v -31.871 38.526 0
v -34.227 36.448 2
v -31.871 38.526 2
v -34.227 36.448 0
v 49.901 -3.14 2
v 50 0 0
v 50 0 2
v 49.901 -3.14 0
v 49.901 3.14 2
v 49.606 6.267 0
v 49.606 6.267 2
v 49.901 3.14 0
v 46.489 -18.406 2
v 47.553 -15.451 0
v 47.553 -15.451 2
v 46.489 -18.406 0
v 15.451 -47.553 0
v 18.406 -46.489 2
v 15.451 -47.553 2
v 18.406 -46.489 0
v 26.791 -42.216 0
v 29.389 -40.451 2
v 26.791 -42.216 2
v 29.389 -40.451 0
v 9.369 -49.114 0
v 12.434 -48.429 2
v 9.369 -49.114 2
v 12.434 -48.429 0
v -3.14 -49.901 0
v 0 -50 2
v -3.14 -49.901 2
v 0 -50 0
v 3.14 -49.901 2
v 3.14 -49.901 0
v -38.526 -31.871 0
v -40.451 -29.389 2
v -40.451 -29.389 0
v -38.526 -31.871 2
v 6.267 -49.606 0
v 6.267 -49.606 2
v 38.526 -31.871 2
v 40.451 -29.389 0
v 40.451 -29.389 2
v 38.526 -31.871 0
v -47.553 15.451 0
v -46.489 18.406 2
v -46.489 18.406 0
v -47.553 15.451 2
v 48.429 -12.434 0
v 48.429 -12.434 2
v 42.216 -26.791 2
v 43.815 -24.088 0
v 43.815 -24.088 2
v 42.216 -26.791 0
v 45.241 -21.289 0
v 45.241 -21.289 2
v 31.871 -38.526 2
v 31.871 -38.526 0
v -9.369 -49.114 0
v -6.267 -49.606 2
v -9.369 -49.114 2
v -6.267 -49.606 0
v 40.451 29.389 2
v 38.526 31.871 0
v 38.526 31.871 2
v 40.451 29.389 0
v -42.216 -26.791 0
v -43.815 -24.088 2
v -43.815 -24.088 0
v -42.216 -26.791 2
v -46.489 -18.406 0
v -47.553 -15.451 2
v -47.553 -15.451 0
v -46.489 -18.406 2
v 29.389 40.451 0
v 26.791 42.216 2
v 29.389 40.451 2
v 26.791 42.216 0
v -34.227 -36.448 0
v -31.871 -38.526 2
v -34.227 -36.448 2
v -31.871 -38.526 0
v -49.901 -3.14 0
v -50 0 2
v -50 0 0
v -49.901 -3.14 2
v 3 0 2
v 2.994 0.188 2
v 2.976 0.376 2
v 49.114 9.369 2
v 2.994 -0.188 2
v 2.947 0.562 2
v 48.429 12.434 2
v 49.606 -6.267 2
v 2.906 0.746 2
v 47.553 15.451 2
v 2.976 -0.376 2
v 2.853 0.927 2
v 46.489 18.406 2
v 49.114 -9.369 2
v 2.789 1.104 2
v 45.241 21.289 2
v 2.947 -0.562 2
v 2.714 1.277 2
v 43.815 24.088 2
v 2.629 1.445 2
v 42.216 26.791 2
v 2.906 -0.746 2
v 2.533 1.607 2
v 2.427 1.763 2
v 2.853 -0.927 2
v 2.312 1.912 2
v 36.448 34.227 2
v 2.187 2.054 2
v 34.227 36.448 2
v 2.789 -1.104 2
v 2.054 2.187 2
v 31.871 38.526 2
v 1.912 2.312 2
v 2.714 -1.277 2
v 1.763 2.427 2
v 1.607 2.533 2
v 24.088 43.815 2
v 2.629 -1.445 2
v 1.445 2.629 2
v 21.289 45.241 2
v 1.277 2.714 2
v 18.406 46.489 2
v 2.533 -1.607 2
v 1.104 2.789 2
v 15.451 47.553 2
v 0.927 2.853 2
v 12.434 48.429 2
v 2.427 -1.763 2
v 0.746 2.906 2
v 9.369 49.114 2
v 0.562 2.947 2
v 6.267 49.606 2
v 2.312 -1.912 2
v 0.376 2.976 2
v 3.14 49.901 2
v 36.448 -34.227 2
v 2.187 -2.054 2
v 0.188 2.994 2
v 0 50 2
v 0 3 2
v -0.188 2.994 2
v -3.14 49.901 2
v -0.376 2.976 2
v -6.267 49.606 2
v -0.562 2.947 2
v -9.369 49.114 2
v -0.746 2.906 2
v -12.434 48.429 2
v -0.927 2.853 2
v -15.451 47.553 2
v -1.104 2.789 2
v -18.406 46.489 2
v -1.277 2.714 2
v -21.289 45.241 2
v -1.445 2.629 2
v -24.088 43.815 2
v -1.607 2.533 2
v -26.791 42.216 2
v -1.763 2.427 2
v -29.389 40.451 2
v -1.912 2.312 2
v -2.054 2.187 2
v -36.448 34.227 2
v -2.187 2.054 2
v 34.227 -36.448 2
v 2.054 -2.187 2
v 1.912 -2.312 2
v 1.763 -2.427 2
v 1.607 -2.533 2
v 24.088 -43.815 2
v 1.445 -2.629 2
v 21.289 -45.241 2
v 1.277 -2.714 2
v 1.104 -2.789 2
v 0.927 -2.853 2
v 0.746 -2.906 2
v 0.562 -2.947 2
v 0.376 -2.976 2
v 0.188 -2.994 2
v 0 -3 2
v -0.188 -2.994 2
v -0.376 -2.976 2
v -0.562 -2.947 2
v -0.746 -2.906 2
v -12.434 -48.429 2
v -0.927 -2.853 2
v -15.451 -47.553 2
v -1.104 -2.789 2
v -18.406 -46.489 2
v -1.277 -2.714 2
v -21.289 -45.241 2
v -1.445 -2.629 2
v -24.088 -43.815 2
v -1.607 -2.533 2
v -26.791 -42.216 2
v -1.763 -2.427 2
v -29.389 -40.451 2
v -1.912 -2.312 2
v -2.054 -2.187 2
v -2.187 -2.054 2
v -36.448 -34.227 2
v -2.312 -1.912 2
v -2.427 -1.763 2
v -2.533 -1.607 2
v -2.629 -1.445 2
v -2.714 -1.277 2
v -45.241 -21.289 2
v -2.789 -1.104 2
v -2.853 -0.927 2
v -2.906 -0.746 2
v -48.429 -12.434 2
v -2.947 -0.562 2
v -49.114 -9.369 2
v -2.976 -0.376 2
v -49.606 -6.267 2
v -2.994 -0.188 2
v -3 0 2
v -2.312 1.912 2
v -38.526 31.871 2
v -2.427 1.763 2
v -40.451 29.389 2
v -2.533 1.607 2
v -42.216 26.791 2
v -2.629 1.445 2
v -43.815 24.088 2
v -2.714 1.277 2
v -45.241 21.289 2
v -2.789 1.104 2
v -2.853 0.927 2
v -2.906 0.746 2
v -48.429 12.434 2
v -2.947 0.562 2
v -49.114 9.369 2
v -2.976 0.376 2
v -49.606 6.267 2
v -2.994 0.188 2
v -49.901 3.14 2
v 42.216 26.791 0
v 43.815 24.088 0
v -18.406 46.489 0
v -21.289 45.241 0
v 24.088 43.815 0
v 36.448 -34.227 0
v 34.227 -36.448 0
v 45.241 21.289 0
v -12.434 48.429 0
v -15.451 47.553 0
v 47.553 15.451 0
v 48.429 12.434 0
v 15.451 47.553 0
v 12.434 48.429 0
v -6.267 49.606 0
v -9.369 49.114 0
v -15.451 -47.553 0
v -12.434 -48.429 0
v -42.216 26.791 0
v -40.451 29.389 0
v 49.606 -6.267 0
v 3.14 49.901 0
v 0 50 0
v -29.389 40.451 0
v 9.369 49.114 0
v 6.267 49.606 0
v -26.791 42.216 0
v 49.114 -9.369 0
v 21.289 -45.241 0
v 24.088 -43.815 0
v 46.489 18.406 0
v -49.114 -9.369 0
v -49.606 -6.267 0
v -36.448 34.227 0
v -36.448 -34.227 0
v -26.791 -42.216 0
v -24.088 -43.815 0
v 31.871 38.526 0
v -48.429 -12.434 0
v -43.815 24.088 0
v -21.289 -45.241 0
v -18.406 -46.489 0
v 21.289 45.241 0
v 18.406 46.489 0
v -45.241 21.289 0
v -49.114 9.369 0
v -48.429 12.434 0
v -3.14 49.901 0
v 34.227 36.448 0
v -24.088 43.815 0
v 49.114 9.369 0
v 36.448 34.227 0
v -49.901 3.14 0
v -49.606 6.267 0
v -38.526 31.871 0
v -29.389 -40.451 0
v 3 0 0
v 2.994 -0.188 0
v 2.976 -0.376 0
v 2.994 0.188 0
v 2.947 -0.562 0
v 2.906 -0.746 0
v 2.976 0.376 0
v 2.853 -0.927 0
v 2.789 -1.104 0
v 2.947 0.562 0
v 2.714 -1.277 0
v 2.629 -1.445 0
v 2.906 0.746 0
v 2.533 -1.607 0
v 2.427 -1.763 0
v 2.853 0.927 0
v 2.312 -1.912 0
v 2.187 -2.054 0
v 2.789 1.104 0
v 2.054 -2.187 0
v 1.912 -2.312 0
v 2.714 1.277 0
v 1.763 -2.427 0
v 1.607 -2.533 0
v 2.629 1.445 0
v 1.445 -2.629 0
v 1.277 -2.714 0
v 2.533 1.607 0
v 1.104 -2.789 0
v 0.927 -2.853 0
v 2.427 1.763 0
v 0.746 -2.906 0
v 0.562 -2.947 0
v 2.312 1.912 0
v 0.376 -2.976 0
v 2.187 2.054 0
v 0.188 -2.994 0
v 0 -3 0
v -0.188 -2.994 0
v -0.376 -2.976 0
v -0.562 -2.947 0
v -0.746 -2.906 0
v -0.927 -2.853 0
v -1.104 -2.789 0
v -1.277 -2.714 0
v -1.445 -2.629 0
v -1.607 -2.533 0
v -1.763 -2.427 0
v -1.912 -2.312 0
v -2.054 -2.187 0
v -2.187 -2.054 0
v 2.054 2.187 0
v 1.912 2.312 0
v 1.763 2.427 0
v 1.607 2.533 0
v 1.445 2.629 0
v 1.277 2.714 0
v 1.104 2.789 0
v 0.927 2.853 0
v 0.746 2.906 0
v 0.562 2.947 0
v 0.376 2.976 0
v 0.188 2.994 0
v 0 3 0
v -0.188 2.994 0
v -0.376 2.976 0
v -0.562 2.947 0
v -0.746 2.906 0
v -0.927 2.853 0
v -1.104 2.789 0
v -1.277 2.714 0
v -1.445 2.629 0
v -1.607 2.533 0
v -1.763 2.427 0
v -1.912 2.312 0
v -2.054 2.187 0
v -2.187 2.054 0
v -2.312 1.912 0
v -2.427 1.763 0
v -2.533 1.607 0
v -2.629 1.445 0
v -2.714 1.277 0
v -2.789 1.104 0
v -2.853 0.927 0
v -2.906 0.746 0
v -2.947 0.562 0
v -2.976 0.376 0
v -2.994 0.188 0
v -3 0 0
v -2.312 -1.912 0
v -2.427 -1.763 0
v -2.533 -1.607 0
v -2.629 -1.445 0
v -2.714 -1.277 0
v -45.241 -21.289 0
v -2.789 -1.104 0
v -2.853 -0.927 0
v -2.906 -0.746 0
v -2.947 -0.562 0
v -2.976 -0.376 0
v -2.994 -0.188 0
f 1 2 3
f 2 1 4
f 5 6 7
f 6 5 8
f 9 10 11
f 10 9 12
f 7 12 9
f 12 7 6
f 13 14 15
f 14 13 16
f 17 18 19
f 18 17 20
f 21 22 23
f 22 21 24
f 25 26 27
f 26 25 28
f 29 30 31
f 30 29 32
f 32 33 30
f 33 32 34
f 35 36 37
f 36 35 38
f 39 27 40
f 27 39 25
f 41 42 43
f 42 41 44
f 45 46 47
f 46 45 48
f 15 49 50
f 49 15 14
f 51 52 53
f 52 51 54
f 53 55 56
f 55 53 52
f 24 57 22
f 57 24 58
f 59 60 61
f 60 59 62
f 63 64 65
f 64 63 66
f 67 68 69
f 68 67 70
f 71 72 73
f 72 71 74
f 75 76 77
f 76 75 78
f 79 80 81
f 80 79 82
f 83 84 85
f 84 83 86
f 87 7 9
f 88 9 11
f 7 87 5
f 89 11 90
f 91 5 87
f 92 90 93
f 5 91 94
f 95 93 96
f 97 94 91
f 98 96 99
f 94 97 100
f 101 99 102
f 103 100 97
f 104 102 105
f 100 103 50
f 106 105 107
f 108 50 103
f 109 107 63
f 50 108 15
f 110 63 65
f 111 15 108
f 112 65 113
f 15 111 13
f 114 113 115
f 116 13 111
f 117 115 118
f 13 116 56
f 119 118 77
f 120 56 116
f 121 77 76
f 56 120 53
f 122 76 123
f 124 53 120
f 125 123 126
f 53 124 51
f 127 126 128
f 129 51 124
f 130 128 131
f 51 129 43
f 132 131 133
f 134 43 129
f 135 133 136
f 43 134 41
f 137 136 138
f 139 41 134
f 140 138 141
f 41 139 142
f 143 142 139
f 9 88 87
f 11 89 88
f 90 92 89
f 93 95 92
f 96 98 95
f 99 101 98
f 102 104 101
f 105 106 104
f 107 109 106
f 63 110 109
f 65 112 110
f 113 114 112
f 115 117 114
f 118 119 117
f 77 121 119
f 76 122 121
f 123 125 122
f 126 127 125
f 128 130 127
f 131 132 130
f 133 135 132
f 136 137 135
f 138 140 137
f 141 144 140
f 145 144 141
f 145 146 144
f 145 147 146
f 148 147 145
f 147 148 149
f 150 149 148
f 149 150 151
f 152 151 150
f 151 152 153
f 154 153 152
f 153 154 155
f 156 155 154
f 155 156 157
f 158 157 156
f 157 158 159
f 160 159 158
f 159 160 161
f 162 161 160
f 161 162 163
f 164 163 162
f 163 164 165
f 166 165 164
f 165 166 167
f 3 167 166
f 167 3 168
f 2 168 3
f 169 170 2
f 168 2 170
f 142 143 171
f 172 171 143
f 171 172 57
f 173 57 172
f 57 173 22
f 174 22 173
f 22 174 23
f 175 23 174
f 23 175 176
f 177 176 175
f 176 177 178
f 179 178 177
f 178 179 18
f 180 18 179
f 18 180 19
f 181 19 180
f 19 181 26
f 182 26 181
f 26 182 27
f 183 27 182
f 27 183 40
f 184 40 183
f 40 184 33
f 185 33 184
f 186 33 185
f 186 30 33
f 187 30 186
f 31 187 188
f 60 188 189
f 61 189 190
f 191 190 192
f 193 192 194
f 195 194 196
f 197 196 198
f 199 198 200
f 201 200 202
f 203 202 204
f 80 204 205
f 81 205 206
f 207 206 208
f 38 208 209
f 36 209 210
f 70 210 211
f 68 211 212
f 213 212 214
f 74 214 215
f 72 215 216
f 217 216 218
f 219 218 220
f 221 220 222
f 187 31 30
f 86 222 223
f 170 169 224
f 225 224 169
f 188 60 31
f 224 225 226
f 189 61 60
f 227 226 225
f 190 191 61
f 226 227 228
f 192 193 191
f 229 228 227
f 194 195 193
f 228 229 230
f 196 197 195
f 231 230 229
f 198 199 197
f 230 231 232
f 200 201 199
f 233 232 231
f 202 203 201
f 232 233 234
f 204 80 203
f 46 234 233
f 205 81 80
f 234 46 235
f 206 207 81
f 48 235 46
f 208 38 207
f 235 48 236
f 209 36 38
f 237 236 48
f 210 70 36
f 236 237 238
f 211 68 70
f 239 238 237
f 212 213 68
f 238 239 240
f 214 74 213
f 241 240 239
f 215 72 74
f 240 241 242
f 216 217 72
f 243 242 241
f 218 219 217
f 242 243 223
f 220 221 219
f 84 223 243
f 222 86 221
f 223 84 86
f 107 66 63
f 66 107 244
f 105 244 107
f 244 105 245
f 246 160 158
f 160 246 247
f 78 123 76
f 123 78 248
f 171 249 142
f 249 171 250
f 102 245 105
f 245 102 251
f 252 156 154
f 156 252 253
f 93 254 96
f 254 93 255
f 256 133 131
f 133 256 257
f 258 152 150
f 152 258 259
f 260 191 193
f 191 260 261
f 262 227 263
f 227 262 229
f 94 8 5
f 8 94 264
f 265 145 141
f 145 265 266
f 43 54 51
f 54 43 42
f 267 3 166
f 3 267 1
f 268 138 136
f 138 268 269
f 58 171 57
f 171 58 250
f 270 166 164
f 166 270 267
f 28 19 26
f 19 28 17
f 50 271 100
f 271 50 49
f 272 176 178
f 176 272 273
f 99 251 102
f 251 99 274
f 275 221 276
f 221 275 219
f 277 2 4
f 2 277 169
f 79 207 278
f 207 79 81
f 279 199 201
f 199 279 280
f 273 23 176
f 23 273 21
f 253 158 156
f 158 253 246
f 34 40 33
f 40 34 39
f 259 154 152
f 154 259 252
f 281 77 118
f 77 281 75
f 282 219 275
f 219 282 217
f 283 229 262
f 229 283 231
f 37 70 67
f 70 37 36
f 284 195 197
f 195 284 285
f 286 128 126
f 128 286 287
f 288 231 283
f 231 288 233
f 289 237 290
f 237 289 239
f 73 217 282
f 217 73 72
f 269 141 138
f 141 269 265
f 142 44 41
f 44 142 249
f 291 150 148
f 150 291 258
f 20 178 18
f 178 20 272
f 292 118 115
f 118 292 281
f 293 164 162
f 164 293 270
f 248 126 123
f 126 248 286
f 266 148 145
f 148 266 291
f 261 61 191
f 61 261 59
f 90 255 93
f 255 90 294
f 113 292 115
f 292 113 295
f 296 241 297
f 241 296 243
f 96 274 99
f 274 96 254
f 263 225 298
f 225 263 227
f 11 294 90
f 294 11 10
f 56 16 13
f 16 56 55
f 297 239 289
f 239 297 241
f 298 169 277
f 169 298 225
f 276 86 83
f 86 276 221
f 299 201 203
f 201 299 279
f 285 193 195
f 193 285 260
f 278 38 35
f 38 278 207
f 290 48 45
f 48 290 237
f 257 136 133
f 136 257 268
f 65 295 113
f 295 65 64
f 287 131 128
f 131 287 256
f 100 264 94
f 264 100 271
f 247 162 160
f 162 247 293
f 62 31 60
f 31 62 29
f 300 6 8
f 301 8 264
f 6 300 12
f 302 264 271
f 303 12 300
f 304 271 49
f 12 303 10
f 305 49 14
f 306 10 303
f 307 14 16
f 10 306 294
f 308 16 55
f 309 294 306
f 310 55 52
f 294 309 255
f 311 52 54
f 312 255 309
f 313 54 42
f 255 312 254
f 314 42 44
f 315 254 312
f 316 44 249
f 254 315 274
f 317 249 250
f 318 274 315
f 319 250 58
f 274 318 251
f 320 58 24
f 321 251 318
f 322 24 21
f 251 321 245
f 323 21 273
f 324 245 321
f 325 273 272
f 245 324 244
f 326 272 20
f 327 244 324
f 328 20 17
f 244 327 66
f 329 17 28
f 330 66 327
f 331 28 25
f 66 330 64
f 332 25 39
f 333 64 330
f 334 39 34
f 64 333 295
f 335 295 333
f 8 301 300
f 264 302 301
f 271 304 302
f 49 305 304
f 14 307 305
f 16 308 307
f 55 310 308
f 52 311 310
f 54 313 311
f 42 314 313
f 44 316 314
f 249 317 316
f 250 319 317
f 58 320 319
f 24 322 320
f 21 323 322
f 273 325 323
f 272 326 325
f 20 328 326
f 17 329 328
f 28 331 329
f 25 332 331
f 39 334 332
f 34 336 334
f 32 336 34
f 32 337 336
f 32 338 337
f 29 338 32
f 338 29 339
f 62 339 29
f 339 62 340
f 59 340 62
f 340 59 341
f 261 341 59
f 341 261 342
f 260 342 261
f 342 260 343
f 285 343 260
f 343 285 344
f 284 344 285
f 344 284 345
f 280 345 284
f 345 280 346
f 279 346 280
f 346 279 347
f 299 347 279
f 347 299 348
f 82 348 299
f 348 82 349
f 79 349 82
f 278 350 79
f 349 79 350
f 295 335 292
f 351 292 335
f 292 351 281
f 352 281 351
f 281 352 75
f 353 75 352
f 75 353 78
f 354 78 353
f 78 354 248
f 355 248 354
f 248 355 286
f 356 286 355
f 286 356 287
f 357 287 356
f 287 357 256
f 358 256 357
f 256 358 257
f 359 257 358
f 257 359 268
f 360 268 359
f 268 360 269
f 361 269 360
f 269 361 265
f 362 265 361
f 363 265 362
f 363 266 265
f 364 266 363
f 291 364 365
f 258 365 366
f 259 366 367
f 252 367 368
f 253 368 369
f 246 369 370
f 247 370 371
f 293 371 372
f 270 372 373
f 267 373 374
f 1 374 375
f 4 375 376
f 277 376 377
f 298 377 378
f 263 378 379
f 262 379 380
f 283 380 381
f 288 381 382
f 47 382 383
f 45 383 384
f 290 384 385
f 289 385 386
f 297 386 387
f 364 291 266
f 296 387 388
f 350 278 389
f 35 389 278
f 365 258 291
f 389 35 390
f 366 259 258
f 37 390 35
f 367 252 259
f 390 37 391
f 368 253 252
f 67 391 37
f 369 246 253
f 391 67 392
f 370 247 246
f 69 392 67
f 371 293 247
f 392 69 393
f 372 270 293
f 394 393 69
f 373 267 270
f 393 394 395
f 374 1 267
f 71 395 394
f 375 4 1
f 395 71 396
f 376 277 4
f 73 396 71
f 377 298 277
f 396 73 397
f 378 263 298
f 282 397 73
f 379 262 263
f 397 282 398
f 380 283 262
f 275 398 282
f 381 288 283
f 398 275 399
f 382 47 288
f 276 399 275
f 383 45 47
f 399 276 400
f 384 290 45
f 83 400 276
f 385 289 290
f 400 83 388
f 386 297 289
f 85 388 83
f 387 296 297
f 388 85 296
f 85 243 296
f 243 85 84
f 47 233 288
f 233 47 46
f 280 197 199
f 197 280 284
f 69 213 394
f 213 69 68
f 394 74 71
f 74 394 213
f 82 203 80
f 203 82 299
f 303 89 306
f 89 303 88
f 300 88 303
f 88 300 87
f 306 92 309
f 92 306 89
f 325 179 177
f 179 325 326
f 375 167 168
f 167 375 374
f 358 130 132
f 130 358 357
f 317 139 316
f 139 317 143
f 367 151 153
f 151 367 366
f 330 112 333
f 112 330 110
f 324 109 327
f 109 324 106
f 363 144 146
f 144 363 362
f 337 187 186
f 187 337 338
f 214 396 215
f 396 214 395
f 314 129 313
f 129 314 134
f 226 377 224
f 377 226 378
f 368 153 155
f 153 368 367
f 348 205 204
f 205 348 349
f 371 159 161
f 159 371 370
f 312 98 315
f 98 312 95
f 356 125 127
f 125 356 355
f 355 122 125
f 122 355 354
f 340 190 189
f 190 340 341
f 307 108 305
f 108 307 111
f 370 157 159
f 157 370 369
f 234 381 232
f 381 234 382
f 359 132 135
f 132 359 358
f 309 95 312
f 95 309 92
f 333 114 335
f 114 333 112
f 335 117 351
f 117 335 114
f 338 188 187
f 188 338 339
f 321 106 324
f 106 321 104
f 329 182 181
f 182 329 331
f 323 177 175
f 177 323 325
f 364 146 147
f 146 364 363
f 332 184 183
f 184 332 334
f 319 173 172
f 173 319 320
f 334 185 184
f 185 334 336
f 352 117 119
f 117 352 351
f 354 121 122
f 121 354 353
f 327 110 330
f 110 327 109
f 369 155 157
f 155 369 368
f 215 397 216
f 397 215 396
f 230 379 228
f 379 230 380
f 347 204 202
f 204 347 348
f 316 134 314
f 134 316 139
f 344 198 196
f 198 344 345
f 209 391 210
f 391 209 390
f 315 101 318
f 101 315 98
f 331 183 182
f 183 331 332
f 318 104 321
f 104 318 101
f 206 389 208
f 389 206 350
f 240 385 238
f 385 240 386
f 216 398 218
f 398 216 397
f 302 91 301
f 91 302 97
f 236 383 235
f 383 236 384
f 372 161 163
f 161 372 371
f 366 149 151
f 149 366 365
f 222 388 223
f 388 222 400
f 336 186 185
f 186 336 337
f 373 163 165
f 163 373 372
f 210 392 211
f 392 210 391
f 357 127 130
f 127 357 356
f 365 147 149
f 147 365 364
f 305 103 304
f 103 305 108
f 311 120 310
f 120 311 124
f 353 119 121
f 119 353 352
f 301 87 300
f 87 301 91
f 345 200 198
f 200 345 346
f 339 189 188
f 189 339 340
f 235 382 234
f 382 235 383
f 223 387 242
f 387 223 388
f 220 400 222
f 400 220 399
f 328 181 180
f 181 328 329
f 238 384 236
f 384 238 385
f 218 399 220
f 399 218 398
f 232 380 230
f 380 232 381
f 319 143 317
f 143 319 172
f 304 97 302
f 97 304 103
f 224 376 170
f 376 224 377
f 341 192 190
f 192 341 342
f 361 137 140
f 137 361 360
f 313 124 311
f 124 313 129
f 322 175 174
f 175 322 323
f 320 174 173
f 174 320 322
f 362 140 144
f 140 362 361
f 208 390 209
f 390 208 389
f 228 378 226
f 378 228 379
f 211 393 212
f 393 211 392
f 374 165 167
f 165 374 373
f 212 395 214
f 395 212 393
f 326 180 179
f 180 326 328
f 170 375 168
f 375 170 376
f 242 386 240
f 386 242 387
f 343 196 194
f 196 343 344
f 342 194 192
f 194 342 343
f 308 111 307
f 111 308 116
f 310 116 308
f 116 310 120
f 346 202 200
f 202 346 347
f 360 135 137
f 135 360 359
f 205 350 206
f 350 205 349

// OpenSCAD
difference() {
 
    cylinder(h = 2, r = 50, $fn = 100);

    cylinder(h = 3, r = 3, $fn = 100);
}   
